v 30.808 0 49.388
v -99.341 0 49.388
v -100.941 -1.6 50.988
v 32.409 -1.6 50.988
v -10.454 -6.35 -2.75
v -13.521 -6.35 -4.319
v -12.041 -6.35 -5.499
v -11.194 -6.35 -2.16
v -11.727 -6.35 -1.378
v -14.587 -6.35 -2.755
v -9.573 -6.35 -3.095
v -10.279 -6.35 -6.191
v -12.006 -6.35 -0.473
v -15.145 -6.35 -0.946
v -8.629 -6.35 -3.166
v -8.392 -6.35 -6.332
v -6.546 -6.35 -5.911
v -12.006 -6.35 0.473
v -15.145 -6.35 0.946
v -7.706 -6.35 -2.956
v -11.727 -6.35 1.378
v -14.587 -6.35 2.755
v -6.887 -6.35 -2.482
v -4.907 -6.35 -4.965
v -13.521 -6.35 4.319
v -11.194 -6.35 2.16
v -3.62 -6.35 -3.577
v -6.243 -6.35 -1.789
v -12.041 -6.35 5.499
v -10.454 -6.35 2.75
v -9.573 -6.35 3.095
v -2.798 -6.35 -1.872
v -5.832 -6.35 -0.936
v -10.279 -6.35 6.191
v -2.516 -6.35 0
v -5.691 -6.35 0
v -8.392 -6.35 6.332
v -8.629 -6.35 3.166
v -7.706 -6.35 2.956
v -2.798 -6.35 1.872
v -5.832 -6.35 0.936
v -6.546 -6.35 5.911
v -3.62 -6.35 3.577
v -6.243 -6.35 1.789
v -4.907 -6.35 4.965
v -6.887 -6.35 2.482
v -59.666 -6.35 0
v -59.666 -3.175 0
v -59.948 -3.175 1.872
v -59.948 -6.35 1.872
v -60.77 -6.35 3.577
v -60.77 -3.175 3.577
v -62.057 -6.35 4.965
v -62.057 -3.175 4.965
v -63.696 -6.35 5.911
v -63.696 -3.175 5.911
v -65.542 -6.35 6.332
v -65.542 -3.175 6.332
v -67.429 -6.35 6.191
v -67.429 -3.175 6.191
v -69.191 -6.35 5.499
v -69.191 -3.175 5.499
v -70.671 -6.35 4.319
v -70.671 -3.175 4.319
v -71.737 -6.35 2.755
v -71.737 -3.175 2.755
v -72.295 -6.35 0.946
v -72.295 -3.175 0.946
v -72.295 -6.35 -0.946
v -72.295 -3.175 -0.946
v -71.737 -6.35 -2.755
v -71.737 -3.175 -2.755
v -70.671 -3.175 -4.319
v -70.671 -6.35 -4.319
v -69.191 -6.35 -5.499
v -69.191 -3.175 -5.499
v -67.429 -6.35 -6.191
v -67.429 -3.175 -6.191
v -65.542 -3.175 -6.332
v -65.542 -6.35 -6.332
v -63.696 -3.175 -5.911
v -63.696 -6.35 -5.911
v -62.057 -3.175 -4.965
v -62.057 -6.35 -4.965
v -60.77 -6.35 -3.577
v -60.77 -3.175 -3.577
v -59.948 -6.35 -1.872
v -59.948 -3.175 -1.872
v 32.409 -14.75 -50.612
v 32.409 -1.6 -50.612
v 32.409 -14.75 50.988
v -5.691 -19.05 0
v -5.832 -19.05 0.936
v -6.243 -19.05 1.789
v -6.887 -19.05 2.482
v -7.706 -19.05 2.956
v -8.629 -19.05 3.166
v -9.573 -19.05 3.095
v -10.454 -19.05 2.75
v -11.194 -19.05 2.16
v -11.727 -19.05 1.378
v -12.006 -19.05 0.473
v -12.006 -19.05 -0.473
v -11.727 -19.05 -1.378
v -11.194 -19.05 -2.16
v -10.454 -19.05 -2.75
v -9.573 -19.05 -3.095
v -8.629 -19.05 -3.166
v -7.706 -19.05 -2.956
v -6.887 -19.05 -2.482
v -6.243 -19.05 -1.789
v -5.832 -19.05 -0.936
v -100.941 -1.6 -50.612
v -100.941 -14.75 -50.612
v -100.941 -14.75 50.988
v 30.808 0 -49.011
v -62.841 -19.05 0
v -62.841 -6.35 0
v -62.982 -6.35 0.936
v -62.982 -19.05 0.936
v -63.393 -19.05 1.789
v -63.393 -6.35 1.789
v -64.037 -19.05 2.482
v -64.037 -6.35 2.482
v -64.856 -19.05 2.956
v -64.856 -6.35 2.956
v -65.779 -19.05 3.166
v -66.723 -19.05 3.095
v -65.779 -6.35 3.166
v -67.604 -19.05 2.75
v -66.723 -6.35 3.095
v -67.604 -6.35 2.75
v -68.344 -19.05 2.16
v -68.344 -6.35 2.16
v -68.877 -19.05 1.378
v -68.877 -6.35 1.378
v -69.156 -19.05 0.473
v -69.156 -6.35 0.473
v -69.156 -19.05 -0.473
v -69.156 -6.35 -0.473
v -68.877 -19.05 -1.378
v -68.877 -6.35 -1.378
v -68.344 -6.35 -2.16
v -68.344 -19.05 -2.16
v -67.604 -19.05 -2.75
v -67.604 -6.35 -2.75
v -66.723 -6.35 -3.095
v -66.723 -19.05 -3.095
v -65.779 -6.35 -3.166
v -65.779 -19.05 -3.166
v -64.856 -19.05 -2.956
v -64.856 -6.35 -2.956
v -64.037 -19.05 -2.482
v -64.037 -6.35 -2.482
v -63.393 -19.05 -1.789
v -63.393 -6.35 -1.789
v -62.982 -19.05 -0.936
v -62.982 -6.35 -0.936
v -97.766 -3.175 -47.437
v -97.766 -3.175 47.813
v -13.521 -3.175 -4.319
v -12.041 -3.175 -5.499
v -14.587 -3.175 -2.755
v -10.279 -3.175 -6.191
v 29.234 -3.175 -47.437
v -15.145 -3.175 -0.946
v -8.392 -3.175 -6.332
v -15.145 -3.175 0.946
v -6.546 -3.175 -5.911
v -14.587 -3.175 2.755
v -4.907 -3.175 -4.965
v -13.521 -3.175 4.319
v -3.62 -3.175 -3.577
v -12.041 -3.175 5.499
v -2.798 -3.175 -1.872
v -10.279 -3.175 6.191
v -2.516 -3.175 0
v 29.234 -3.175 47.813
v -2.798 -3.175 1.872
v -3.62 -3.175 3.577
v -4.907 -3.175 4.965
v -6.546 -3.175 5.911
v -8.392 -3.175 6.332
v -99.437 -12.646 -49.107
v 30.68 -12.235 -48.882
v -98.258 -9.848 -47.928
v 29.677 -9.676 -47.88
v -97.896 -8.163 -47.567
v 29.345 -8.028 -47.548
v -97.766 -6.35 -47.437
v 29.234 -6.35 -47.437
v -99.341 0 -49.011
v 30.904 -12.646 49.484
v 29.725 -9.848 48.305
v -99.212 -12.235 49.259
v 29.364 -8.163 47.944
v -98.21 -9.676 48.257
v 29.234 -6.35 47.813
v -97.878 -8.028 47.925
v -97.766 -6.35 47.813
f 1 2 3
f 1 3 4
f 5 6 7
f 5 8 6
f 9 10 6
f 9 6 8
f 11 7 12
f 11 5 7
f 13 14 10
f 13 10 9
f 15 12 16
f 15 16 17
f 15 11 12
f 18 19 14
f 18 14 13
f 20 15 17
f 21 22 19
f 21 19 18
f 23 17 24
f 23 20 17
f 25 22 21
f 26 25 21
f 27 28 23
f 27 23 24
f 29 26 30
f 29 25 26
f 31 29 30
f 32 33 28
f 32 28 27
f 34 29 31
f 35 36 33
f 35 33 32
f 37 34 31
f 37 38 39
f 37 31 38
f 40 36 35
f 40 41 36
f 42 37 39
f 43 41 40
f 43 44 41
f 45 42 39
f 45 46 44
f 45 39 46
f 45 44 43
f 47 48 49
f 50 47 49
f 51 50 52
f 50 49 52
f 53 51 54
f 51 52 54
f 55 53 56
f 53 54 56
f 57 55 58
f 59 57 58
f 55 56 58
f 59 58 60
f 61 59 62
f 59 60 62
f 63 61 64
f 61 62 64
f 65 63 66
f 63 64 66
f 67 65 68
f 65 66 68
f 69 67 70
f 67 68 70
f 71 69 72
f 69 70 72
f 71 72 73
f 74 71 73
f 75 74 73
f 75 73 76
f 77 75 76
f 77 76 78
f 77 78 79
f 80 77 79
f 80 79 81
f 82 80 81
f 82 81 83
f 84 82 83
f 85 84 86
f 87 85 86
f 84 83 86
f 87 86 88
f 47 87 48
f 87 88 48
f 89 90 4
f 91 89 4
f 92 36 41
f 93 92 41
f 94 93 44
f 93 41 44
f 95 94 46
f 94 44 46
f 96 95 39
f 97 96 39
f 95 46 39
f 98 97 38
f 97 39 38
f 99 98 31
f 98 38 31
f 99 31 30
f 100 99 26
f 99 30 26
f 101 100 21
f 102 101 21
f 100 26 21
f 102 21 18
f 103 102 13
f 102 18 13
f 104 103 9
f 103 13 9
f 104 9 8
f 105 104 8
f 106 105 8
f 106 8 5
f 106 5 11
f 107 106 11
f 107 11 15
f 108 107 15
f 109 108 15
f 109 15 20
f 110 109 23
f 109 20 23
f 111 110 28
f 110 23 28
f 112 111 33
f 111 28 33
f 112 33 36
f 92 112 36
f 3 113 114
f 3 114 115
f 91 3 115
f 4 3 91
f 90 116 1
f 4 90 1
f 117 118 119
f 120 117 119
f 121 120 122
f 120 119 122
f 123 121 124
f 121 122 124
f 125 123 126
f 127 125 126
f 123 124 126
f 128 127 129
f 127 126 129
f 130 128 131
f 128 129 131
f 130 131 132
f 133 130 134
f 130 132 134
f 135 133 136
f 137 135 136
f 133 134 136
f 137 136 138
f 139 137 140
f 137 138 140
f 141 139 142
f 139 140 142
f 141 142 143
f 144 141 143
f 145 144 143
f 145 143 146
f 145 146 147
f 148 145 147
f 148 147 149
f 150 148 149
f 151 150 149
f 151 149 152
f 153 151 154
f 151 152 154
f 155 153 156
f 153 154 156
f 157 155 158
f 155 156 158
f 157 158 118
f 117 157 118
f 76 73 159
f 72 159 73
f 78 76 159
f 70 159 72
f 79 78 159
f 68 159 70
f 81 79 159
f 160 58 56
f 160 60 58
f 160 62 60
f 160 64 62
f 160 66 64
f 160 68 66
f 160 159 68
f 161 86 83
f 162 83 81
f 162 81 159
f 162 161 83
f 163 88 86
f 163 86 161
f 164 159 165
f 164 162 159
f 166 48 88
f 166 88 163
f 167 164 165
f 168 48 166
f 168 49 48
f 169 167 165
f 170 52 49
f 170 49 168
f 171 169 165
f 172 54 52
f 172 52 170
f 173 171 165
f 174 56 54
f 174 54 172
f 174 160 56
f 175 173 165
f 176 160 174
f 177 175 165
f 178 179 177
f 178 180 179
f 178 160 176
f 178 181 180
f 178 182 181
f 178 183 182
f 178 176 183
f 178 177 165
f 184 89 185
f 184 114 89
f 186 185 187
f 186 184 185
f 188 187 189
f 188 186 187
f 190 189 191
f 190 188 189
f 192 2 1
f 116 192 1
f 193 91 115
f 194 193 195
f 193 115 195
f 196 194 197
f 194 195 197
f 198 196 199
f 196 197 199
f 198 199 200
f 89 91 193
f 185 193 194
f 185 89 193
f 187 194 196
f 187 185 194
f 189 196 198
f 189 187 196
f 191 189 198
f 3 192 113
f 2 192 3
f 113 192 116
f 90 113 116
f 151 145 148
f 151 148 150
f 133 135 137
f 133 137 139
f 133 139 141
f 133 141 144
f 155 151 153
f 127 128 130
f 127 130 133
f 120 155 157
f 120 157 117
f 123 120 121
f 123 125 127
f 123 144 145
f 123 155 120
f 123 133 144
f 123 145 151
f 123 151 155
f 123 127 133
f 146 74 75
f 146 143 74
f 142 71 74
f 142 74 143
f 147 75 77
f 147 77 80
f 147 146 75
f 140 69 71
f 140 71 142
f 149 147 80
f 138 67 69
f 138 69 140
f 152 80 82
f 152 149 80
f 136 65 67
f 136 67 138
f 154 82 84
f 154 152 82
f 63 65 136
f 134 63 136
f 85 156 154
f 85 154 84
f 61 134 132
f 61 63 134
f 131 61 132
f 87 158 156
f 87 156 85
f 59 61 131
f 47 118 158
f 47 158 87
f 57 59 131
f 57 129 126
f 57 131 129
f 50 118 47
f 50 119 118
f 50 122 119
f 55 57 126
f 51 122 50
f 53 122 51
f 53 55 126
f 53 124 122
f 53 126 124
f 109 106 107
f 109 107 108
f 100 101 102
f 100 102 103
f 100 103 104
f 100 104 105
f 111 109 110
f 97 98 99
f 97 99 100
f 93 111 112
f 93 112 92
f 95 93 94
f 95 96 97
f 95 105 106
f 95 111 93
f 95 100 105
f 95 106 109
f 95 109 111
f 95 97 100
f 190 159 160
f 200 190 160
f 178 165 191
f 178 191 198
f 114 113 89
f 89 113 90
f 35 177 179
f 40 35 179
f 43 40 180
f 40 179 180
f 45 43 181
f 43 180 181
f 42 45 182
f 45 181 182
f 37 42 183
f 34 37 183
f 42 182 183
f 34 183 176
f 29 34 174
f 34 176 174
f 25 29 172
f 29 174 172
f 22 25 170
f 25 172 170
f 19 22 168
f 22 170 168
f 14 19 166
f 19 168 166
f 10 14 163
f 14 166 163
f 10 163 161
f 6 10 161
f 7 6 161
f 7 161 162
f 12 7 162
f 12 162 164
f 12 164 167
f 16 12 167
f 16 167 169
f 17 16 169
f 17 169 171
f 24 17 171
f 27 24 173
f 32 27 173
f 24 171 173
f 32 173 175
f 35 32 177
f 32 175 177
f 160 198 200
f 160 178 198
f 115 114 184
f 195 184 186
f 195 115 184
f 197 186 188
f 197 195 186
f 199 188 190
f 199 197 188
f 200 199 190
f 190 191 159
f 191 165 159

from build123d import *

# Parameters (mm, degrees)
F0_W         = 133.35
F0_H         = 101.6
F1_DEPTH     = 19.05
F2_T         = -3.175
F3_R         = 6.35
F4_DEPTH     = 3.175
F5_R         = 3.175
F6_DEPTH     = 12.7
F7_R         = 3.175
F8_DEPTH     = 12.7
F9_T1_DEPTH  = 95.25
F9_T3_DEPTH  = 127
F9_T9_DEPTH  = 158.75
F9_T15_DEPTH = 127
F9_T24_DEPTH = 158.75
F9_T30_DEPTH = 127
F9_T39_DEPTH = 127
F9_T45_DEPTH = 158.75
F9_T54_DEPTH = 158.75
F9_T60_DEPTH = 127
F10_SIZE     = 1.6002


# Not quite as in the source:
# - a fillet or chamfer that OpenCascade refuses, or shapes differently, is made with other operations: its cross-section is extruded or revolved along the edge and cut away or added


with BuildPart() as f1:
    # F0 (on Front) → F1 (new body)
    with BuildSketch(Plane.XZ):
        with Locations((-34.2663429767, 0.1884810627)):
            Rectangle(F0_W, F0_H)
    extrude(amount=F1_DEPTH)

    # F2
    f2_openings = [f1.faces().sort_by_distance(p)[0] for p in [
        (-34.266343, -19.05, 0.188481),
    ]]
    offset(amount=F2_T, openings=f2_openings)

    # F3 (on face) → F4 (join)
    with BuildSketch(Plane.XZ.offset(3.175)):
        with Locations((-66.0163429767, 0)):
            Circle(F3_R)
        with Locations((-8.8663429767, 0)):
            Circle(F3_R)
    extrude(amount=F4_DEPTH)

    # F5 (on face) → F6 (join)
    with BuildSketch(Plane.XZ.offset(6.35)):
        with Locations((-66.0163429767, 0)):
            Circle(F5_R)
    extrude(amount=F6_DEPTH)

    # F7 (on face) → F8 (join)
    with BuildSketch(Plane.XZ.offset(6.35)):
        with Locations((-8.8663429767, 0)):
            Circle(F7_R)
    extrude(amount=F8_DEPTH)

    # F9: fillet of radius 12.7 on 4 edges, made by hand

    # F9_s2 → F9_t1 (cut)
    with BuildSketch(Plane.XY.offset(-47.4365189373)):
        with BuildLine():
            ThreePointArc((-110.4663429767, -19.05), (-101.4860868556, -15.3302561211), (-97.7663429767, -6.35))
            Line((-97.7663429767, -6.35), (-97.7663429767, -19.05))
            Line((-97.7663429767, -19.05), (-110.4663429767, -19.05))
        make_face()
        with BuildLine():
            ThreePointArc((41.9336570233, -19.05), (32.9534009023, -15.3302561211), (29.2336570233, -6.35))
            Line((29.2336570233, -6.35), (29.2336570233, -19.05))
            Line((29.2336570233, -19.05), (41.9336570233, -19.05))
        make_face()
    extrude(amount=F9_T1_DEPTH, mode=Mode.SUBTRACT)

    # F9_s4 → F9_t3 (cut)
    with BuildSketch(Plane.YZ.offset(-97.7663429767)):
        with BuildLine():
            ThreePointArc((-19.05, -60.1365189373), (-15.3302561211, -51.1562628163), (-6.35, -47.4365189373))
            Line((-6.35, -47.4365189373), (-19.05, -47.4365189373))
            Line((-19.05, -47.4365189373), (-19.05, -60.1365189373))
        make_face()
        with BuildLine():
            ThreePointArc((-19.05, 60.5134810627), (-15.3302561211, 51.5332249416), (-6.35, 47.8134810627))
            Line((-6.35, 47.8134810627), (-19.05, 47.8134810627))
            Line((-19.05, 47.8134810627), (-19.05, 60.5134810627))
        make_face()
    extrude(amount=F9_T3_DEPTH, mode=Mode.SUBTRACT)


with BuildPart() as f9_tool7:
    # F9_s8 → F9_t9 (new body)
    with BuildSketch(Plane.YZ.offset(29.2336570233)):
        with BuildLine():
            ThreePointArc((-19.05, 60.5134810627), (-15.3302561211, 51.5332249416), (-6.35, 47.8134810627))
            Line((-6.35, 47.8134810627), (-19.05, 47.8134810627))
            Line((-19.05, 47.8134810627), (-19.05, 60.5134810627))
        make_face()
    extrude(amount=-F9_T9_DEPTH)

    split(bisect_by=Plane.XY.offset(50.9884810627), keep=Keep.BOTTOM)

    split(bisect_by=Plane.YZ.offset(-100.9413429767), keep=Keep.TOP)

    split(bisect_by=Plane.YZ.offset(-97.7663429767), keep=Keep.BOTTOM)


with BuildPart() as f9_tool13:
    # F9_s14 → F9_t15 (new body)
    with BuildSketch(Plane.XY.offset(79.5634810627)):
        with BuildLine():
            ThreePointArc((-110.4663429767, -19.05), (-101.4860868556, -15.3302561211), (-97.7663429767, -6.35))
            Line((-97.7663429767, -6.35), (-97.7663429767, -19.05))
            Line((-97.7663429767, -19.05), (-110.4663429767, -19.05))
        make_face()
    extrude(amount=-F9_T15_DEPTH)

    split(bisect_by=Plane.XY.offset(50.9884810627), keep=Keep.BOTTOM)

    split(bisect_by=Plane.YZ.offset(-100.9413429767), keep=Keep.TOP)

    split(bisect_by=Plane.XY.offset(47.8134810627), keep=Keep.TOP)


with BuildPart() as f9_tool7_1:
    add(f9_tool7.part)

    # F9_t19: intersect F9_tool13
    add(f9_tool13.part, mode=Mode.INTERSECT)


with BuildPart() as f1_1:
    add(f1.part)

    # F9_t5: cut F9_tool7
    add(f9_tool7_1.part, mode=Mode.SUBTRACT)


with BuildPart() as f9_tool22:
    # F9_s23 → F9_t24 (new body)
    with BuildSketch(Plane.YZ.offset(-129.5163429767)):
        with BuildLine():
            ThreePointArc((-19.05, -60.1365189373), (-15.3302561211, -51.1562628163), (-6.35, -47.4365189373))
            Line((-6.35, -47.4365189373), (-19.05, -47.4365189373))
            Line((-19.05, -47.4365189373), (-19.05, -60.1365189373))
        make_face()
    extrude(amount=F9_T24_DEPTH)

    split(bisect_by=Plane.YZ.offset(-100.9413429767), keep=Keep.TOP)

    split(bisect_by=Plane.XY.offset(-50.6115189373), keep=Keep.TOP)

    split(bisect_by=Plane.YZ.offset(-97.7663429767), keep=Keep.BOTTOM)


with BuildPart() as f9_tool28:
    # F9_s29 → F9_t30 (new body)
    with BuildSketch(Plane.XY.offset(47.8134810627)):
        with BuildLine():
            ThreePointArc((-110.4663429767, -19.05), (-101.4860868556, -15.3302561211), (-97.7663429767, -6.35))
            Line((-97.7663429767, -6.35), (-97.7663429767, -19.05))
            Line((-97.7663429767, -19.05), (-110.4663429767, -19.05))
        make_face()
    extrude(amount=-F9_T30_DEPTH)

    split(bisect_by=Plane.YZ.offset(-100.9413429767), keep=Keep.TOP)

    split(bisect_by=Plane.XY.offset(-50.6115189373), keep=Keep.TOP)

    split(bisect_by=Plane.XY.offset(-47.4365189373), keep=Keep.BOTTOM)


with BuildPart() as f9_tool22_1:
    add(f9_tool22.part)

    # F9_t34: intersect F9_tool28
    add(f9_tool28.part, mode=Mode.INTERSECT)


with BuildPart() as f1_2:
    add(f1_1.part)

    # F9_t20: cut F9_tool22
    add(f9_tool22_1.part, mode=Mode.SUBTRACT)


with BuildPart() as f9_tool37:
    # F9_s38 → F9_t39 (new body)
    with BuildSketch(Plane.XY.offset(-79.1865189373)):
        with BuildLine():
            ThreePointArc((41.9336570233, -19.05), (32.9534009023, -15.3302561211), (29.2336570233, -6.35))
            Line((29.2336570233, -6.35), (29.2336570233, -19.05))
            Line((29.2336570233, -19.05), (41.9336570233, -19.05))
        make_face()
    extrude(amount=F9_T39_DEPTH)

    split(bisect_by=Plane.YZ.offset(32.4086570233), keep=Keep.BOTTOM)

    split(bisect_by=Plane.XY.offset(-50.6115189373), keep=Keep.TOP)

    split(bisect_by=Plane.XY.offset(-47.4365189373), keep=Keep.BOTTOM)


with BuildPart() as f9_tool43:
    # F9_s44 → F9_t45 (new body)
    with BuildSketch(Plane.YZ.offset(-97.7663429767)):
        with BuildLine():
            ThreePointArc((-19.05, -60.1365189373), (-15.3302561211, -51.1562628163), (-6.35, -47.4365189373))
            Line((-6.35, -47.4365189373), (-19.05, -47.4365189373))
            Line((-19.05, -47.4365189373), (-19.05, -60.1365189373))
        make_face()
    extrude(amount=F9_T45_DEPTH)

    split(bisect_by=Plane.YZ.offset(32.4086570233), keep=Keep.BOTTOM)

    split(bisect_by=Plane.XY.offset(-50.6115189373), keep=Keep.TOP)

    split(bisect_by=Plane.YZ.offset(29.2336570233), keep=Keep.TOP)


with BuildPart() as f9_tool37_1:
    add(f9_tool37.part)

    # F9_t49: intersect F9_tool43
    add(f9_tool43.part, mode=Mode.INTERSECT)


with BuildPart() as f1_3:
    add(f1_2.part)

    # F9_t35: cut F9_tool37
    add(f9_tool37_1.part, mode=Mode.SUBTRACT)


with BuildPart() as f9_tool52:
    # F9_s53 → F9_t54 (new body)
    with BuildSketch(Plane.YZ.offset(60.9836570233)):
        with BuildLine():
            ThreePointArc((-19.05, 60.5134810627), (-15.3302561211, 51.5332249416), (-6.35, 47.8134810627))
            Line((-6.35, 47.8134810627), (-19.05, 47.8134810627))
            Line((-19.05, 47.8134810627), (-19.05, 60.5134810627))
        make_face()
    extrude(amount=-F9_T54_DEPTH)

    split(bisect_by=Plane.XY.offset(50.9884810627), keep=Keep.BOTTOM)

    split(bisect_by=Plane.YZ.offset(32.4086570233), keep=Keep.BOTTOM)

    split(bisect_by=Plane.YZ.offset(29.2336570233), keep=Keep.TOP)


with BuildPart() as f9_tool58:
    # F9_s59 → F9_t60 (new body)
    with BuildSketch(Plane.XY.offset(-47.4365189373)):
        with BuildLine():
            ThreePointArc((41.9336570233, -19.05), (32.9534009023, -15.3302561211), (29.2336570233, -6.35))
            Line((29.2336570233, -6.35), (29.2336570233, -19.05))
            Line((29.2336570233, -19.05), (41.9336570233, -19.05))
        make_face()
    extrude(amount=F9_T60_DEPTH)

    split(bisect_by=Plane.XY.offset(50.9884810627), keep=Keep.BOTTOM)

    split(bisect_by=Plane.YZ.offset(32.4086570233), keep=Keep.BOTTOM)

    split(bisect_by=Plane.XY.offset(47.8134810627), keep=Keep.TOP)


with BuildPart() as f9_tool52_1:
    add(f9_tool52.part)

    # F9_t64: intersect F9_tool58
    add(f9_tool58.part, mode=Mode.INTERSECT)


with BuildPart() as f1_4:
    add(f1_3.part)

    # F9_t50: cut F9_tool52
    add(f9_tool52_1.part, mode=Mode.SUBTRACT)

    # F10
    f10_edges = [f1_4.edges().sort_by_distance(p)[0] for p in [
        (-34.266343, 0, 50.988481),
        (-100.941343, 0, 0.188481),
        (-34.266343, 0, -50.611519),
        (32.408657, 0, 0.188481),
    ]]
    chamfer(f10_edges, length=F10_SIZE)


solid = f1_4.part
